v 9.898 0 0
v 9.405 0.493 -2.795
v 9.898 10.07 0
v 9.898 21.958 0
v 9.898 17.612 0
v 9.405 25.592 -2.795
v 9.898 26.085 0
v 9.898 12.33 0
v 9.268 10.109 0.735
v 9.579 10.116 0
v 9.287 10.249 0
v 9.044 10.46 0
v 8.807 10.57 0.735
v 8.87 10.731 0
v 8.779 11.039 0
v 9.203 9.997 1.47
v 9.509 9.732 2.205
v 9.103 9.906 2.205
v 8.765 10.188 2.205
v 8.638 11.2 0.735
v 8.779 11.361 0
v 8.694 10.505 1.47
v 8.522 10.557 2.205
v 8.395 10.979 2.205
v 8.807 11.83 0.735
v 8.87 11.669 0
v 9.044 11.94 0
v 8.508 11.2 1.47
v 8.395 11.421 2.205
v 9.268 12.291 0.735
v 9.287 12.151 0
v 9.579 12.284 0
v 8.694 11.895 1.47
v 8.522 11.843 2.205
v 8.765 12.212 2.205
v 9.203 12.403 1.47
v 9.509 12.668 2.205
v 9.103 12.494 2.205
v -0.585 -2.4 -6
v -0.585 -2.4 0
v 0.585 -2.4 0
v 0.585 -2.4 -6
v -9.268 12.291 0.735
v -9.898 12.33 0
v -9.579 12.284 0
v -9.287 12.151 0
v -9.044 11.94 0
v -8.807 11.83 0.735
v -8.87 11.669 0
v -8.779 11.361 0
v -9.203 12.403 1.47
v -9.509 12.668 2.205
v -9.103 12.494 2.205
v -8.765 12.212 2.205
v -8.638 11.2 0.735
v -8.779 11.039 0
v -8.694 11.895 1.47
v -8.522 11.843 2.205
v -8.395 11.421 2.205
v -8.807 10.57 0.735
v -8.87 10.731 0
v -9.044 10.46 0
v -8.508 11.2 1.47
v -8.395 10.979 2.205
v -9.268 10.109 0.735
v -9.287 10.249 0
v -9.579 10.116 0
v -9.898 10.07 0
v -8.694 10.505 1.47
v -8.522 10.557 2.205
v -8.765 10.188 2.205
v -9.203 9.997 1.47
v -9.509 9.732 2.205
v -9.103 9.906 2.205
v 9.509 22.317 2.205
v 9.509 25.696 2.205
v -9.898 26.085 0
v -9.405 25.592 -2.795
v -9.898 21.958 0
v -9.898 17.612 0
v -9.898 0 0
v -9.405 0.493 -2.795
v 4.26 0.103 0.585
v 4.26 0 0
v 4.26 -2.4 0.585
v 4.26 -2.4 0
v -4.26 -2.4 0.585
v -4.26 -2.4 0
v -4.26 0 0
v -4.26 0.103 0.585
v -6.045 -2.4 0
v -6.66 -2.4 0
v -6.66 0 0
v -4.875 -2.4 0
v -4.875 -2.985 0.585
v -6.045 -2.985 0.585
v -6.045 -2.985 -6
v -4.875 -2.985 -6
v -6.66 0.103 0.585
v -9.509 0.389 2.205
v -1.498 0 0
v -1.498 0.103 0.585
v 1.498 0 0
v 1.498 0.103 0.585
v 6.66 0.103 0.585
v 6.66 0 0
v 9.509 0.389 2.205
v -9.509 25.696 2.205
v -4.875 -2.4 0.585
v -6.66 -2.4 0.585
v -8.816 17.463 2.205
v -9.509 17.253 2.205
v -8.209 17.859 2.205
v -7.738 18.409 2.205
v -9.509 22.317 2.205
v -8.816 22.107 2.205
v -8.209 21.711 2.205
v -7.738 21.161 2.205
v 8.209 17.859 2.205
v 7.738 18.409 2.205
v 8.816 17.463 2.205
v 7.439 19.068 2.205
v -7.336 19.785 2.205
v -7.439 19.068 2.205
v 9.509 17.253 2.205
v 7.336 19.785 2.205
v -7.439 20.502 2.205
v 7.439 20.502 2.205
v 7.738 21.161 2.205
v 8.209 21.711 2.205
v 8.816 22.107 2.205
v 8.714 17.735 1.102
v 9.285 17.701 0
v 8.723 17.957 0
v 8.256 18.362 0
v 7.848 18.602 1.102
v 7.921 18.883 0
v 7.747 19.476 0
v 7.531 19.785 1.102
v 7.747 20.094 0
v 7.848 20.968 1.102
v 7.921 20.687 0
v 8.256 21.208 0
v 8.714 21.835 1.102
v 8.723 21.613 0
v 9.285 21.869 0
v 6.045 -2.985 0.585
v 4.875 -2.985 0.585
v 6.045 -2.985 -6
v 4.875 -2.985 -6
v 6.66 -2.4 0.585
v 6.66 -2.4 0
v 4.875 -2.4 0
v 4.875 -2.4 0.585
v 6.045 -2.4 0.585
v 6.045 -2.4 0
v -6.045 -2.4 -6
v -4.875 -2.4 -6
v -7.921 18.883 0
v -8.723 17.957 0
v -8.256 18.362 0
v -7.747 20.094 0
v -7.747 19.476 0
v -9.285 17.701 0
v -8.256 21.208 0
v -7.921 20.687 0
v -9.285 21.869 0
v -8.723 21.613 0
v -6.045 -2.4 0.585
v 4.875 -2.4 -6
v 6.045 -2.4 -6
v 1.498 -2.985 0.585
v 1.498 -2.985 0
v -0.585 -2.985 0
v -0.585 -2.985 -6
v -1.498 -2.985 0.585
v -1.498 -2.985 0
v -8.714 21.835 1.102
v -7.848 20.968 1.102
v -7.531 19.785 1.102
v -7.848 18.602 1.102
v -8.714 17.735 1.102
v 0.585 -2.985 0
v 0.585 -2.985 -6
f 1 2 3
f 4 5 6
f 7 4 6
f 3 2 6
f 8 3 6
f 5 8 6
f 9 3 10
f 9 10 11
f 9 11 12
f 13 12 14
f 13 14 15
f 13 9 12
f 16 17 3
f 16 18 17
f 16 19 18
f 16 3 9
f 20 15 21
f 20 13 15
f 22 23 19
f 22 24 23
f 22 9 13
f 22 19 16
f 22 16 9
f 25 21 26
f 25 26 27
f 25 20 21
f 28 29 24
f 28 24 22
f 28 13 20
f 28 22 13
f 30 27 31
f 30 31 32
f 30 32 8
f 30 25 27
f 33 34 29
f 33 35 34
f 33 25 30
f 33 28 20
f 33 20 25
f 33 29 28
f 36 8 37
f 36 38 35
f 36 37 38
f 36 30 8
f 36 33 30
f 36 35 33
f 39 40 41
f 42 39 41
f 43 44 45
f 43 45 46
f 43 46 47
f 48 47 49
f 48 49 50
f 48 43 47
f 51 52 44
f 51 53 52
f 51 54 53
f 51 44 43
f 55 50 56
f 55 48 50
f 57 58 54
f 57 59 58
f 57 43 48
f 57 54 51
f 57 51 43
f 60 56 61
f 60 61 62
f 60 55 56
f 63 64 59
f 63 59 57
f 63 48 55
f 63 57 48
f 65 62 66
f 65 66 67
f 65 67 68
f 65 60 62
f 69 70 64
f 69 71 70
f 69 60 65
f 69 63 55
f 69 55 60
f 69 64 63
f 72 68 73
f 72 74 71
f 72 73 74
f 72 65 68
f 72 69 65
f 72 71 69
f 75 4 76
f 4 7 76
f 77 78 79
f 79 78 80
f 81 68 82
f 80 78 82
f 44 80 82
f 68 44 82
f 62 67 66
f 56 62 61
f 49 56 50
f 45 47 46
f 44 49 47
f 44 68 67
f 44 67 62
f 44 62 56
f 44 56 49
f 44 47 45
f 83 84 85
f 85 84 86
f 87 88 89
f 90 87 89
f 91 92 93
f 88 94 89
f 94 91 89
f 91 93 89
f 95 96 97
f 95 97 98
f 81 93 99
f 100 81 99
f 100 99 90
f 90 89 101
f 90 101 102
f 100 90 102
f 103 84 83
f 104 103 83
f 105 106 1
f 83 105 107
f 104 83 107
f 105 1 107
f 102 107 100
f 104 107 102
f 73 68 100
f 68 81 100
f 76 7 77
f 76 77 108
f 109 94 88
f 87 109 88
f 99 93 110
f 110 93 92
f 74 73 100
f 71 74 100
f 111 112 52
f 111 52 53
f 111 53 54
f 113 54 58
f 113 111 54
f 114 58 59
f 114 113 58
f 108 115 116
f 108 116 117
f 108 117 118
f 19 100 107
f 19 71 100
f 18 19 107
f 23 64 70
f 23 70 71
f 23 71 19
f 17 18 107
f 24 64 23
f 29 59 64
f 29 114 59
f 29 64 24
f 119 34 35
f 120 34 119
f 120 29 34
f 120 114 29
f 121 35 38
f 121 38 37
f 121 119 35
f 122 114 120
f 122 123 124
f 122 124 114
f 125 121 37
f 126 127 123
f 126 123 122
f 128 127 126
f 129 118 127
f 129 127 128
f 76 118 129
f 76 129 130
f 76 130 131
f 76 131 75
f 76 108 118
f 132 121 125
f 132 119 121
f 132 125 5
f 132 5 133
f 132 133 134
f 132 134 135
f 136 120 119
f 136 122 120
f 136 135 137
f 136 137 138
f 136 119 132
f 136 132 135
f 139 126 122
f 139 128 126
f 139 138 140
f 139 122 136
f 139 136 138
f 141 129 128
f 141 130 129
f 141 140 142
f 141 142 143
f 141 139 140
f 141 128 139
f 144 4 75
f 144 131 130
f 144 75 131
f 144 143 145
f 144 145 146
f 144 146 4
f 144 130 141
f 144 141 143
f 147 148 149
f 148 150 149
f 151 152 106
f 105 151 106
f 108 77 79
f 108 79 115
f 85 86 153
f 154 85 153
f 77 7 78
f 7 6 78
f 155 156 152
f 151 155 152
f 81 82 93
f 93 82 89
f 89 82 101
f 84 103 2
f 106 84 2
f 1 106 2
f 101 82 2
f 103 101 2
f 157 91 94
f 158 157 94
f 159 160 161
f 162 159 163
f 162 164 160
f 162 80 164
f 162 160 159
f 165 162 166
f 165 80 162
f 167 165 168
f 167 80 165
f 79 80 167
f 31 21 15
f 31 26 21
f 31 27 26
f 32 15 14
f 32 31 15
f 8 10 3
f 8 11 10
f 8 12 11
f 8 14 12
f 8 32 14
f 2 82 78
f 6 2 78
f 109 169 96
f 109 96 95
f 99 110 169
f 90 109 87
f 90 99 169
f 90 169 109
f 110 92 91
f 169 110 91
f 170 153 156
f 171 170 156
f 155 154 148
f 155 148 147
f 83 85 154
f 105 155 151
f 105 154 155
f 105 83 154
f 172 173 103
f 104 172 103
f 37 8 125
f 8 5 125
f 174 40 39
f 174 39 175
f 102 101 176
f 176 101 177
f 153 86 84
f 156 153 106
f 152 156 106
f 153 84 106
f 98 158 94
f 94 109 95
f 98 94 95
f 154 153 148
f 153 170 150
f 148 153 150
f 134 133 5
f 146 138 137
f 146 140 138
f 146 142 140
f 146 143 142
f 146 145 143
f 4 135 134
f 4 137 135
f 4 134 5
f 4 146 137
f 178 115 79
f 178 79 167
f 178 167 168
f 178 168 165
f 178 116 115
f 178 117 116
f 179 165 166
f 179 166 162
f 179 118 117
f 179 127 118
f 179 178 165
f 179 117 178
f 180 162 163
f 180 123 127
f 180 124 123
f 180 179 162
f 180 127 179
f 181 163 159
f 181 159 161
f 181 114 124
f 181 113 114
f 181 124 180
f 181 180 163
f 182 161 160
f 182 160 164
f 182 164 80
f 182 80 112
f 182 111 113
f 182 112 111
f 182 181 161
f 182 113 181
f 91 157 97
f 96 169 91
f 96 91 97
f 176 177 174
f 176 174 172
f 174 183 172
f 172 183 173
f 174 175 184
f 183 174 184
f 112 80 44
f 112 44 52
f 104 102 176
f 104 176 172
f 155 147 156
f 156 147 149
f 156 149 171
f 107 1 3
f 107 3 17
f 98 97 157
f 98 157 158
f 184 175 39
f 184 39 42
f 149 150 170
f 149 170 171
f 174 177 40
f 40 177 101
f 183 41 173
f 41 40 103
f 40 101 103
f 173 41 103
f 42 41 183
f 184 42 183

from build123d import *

# Parameters (mm, degrees)
F4_DEPTH  = 2.205
F4_TAPER  = 10
F5_W      = 2.995
F5_H      = 0.9355060756
F5_H_2    = 2.985
F5_W_2    = 2.4
F6_DEPTH  = 0.585
F7_W      = 19.795
F7_H      = 26.085
F8_DEPTH  = 2.795
F8_TAPER  = 10
F9_W      = 1.17
F9_H      = 0.585
F10_DEPTH = 6


with BuildPart() as f4:
    # F3 (on Top) → F4 (new body)
    with BuildSketch(Plane.XY):
        with BuildLine():
            Line((9.8975, 21.9575), (9.8975, 26.085))
            Line((9.8975, 26.085), (-9.8975, 26.085))
            Line((-9.8975, 26.085), (-9.8975, 21.9575))
            ThreePointArc((-9.8975, 21.9575), (-7.725, 19.785), (-9.8975, 17.6125))
            Line((-9.8975, 17.6125), (-9.8975, 12.33))
            ThreePointArc((-9.8975, 12.33), (-8.7675, 11.2), (-9.8975, 10.07))
            Line((-9.8975, 10.07), (-9.8975, 0))
            Line((-9.8975, 0), (9.8975, 0))
            Line((9.8975, 0), (9.8975, 10.07))
            ThreePointArc((9.8975, 10.07), (8.7675, 11.2), (9.8975, 12.33))
            Line((9.8975, 12.33), (9.8975, 17.6125))
            ThreePointArc((9.8975, 17.6125), (7.725, 19.785), (9.8975, 21.9575))
        make_face()
    extrude(amount=F4_DEPTH, taper=F4_TAPER)

    # F5 (on face) → F6 (join)
    with BuildSketch(Plane.XY):
        with Locations((0, 0.4677530378)):
            Rectangle(F5_W, F5_H)
        with Locations((0, -1.4925)):
            Rectangle(F5_W, F5_H_2)
        with Locations((-5.46, 0.4677530378)):
            Rectangle(F5_W_2, F5_H)
        Polygon((-4.26, 0), (-6.66, 0), (-6.66, -2.4), (-6.045, -2.4), (-6.045, -2.985), (-4.875, -2.985), (-4.875, -2.4), (-4.26, -2.4), align=None)
        Polygon((4.875, -2.985), (6.045, -2.985), (6.045, -2.4), (6.66, -2.4), (6.66, 0), (4.26, 0), (4.26, -2.4), (4.875, -2.4), align=None)
        with Locations((5.46, 0.4677530378)):
            Rectangle(F5_W_2, F5_H)
    extrude(amount=F6_DEPTH)

    # F7 (on face) → F8 (join)
    with BuildSketch(Plane.XY):
        with Locations((0, 13.0425)):
            Rectangle(F7_W, F7_H)
    extrude(amount=-F8_DEPTH, taper=F8_TAPER)

    # F9 (on face) → F10 (join)
    with BuildSketch(Plane(origin=(0, 0, 0), x_dir=(1, 0, 0), z_dir=(0, 0, -1))):
        with Locations((0, 2.6925)):
            Rectangle(F9_W, F9_H)
        with Locations((-5.46, 2.6925)):
            Rectangle(F9_W, F9_H)
        with Locations((5.46, 2.6925)):
            Rectangle(F9_W, F9_H)
    extrude(amount=F10_DEPTH)


solid = f4.part
